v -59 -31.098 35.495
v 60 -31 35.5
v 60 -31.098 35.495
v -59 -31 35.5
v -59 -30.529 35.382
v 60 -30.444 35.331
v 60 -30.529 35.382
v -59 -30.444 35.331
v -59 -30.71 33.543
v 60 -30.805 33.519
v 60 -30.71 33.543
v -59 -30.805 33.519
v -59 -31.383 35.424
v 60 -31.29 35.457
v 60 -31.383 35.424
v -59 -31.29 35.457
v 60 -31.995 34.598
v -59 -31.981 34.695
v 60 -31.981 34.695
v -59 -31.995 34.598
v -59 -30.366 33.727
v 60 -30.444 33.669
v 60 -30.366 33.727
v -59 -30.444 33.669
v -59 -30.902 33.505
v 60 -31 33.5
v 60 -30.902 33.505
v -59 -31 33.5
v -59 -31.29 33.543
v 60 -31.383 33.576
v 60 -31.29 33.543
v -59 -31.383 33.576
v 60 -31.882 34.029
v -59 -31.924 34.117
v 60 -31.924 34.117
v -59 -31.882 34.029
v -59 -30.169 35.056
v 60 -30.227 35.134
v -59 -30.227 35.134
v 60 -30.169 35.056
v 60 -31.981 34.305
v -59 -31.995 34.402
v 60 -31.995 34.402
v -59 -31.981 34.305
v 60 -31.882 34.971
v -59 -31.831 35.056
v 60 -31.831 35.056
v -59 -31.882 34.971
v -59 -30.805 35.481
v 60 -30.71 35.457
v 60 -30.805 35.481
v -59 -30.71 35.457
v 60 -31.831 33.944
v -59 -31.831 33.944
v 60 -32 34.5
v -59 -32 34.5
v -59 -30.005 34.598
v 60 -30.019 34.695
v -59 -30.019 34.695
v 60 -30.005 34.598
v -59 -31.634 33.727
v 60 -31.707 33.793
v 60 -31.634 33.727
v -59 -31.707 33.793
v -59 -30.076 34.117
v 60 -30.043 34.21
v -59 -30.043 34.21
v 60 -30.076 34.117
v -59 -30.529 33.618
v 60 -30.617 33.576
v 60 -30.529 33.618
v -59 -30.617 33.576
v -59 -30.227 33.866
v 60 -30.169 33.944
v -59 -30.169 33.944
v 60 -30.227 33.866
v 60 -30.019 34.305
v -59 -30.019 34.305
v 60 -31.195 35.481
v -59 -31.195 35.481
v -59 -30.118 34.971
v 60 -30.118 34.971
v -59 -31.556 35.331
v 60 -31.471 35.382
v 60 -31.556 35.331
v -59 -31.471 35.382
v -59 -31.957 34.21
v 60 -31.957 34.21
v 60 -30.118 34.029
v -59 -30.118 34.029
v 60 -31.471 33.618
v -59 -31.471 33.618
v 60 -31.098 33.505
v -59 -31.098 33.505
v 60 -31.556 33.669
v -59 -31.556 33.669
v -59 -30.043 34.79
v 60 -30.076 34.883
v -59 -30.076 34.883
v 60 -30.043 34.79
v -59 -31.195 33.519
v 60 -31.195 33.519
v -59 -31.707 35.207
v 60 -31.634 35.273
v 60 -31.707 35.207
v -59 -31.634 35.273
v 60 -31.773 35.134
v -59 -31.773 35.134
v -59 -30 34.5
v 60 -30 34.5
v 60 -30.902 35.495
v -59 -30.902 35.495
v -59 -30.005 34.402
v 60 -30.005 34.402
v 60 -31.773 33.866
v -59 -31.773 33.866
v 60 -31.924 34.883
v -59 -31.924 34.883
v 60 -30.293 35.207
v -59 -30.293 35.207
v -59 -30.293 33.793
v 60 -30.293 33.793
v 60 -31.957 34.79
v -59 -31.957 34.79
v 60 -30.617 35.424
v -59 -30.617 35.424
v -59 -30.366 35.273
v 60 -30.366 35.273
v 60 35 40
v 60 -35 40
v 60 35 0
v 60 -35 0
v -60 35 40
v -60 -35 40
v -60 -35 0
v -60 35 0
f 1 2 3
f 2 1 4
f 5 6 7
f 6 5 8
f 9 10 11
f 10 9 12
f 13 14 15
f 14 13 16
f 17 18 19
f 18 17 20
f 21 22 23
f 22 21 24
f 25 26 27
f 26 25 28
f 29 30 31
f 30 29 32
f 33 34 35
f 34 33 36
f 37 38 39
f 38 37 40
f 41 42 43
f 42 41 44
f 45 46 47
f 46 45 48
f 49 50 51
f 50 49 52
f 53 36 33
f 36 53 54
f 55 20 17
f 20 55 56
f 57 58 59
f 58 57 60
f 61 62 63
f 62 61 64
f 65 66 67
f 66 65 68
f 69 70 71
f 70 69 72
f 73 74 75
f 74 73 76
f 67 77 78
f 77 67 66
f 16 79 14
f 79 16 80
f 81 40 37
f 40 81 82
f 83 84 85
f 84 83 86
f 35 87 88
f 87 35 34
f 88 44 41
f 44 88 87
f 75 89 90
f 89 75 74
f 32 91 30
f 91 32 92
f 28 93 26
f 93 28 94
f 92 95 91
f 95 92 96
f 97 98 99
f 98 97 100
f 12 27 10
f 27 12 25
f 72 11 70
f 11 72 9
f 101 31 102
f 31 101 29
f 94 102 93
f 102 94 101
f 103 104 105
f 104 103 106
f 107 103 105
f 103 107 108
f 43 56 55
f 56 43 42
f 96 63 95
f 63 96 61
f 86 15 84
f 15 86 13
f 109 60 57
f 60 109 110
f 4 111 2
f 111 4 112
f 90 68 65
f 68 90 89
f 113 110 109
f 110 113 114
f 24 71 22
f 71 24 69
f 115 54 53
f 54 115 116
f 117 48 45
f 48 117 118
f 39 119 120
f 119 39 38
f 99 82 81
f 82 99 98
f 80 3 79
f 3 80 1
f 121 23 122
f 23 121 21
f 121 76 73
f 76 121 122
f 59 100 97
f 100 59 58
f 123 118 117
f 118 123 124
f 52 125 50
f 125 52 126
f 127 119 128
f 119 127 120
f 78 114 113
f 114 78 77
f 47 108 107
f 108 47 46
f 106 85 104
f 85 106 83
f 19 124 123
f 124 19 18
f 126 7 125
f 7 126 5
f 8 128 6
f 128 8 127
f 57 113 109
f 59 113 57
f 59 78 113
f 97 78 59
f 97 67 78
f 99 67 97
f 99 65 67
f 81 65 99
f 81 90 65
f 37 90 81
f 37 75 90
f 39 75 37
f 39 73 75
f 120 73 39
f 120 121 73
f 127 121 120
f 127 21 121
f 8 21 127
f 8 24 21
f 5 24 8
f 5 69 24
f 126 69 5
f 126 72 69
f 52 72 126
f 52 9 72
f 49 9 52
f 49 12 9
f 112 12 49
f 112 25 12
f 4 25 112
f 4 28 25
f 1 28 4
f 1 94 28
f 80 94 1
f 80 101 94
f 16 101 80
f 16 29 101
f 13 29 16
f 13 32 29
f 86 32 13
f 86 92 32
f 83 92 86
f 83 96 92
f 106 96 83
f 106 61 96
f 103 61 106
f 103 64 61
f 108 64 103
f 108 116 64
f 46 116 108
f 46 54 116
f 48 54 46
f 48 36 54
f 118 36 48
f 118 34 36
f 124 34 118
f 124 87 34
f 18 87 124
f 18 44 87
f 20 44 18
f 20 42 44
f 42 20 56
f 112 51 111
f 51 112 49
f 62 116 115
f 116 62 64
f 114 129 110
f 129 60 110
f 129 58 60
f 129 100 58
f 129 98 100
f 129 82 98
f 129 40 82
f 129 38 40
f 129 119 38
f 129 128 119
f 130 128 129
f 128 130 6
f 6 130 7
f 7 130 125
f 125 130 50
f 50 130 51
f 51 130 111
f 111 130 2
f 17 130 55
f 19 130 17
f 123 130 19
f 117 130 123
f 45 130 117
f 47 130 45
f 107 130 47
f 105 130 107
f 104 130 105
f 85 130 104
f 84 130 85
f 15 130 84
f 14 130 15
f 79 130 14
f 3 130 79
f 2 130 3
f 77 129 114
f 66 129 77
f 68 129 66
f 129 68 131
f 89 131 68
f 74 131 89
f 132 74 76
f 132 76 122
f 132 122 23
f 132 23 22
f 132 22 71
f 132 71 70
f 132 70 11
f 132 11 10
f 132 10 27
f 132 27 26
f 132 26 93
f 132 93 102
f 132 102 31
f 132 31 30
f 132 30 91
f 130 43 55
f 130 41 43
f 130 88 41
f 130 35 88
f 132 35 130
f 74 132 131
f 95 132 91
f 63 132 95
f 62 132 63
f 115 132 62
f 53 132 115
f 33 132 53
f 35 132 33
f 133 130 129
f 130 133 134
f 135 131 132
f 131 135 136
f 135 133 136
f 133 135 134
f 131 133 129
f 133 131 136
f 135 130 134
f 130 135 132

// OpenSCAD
// Mini horizontal gel-electrophoresis box - buffer tank
// Print orientation: tank rests on XY plane, open top facing +Z

// ---------- Parameters ----------
outer_x      = 120;   // outer length (X)
outer_y      = 70;    // outer width (Y)
outer_h      = 40;    // outer height (Z)
wall         = 3;     // wall thickness
floor        = 3;     // floor thickness
platform_x   = 60;    // platform length in X (centred)
platform_top = 10;    // platform top height above inner floor
hole_d       = 2;     // electrode hole diameter
eps          = 0.5;   // cutter overshoot past faces

$fn = 64;

// ---------- Derived ----------
inner_h   = outer_h - floor - wall;              // 34 mm
pitch     = outer_x / 2 - platform_x / 2;        // chamber length
y1        = -outer_y / 2 + wall + 1;             // left end wall Y
y2        = outer_y / 2 - wall - 1;              // right end wall Y

// ---------- Model ----------
difference() {
    // Tank body
    translate([-outer_x / 2, -outer_y / 2, 0])
        cube([outer_x, outer_y, outer_h]);

    // Raised central platform (solid, no cut through)
    translate([-platform_x / 2, -outer_y / 2, outer_h - floor - wall + platform_top])
        cube([platform_x, outer_y, floor + wall + eps]);

    // Horizontal electrode holes through end walls along X
    for (s = [-1, 1])
        translate([s * (outer_x / 2 - hole_d / 2), y1, outer_h - floor - wall + eps])
            rotate([0, 90, 0])
                cylinder(d = hole_d, h = outer_x + 2 * eps, $fn = 64);
}
